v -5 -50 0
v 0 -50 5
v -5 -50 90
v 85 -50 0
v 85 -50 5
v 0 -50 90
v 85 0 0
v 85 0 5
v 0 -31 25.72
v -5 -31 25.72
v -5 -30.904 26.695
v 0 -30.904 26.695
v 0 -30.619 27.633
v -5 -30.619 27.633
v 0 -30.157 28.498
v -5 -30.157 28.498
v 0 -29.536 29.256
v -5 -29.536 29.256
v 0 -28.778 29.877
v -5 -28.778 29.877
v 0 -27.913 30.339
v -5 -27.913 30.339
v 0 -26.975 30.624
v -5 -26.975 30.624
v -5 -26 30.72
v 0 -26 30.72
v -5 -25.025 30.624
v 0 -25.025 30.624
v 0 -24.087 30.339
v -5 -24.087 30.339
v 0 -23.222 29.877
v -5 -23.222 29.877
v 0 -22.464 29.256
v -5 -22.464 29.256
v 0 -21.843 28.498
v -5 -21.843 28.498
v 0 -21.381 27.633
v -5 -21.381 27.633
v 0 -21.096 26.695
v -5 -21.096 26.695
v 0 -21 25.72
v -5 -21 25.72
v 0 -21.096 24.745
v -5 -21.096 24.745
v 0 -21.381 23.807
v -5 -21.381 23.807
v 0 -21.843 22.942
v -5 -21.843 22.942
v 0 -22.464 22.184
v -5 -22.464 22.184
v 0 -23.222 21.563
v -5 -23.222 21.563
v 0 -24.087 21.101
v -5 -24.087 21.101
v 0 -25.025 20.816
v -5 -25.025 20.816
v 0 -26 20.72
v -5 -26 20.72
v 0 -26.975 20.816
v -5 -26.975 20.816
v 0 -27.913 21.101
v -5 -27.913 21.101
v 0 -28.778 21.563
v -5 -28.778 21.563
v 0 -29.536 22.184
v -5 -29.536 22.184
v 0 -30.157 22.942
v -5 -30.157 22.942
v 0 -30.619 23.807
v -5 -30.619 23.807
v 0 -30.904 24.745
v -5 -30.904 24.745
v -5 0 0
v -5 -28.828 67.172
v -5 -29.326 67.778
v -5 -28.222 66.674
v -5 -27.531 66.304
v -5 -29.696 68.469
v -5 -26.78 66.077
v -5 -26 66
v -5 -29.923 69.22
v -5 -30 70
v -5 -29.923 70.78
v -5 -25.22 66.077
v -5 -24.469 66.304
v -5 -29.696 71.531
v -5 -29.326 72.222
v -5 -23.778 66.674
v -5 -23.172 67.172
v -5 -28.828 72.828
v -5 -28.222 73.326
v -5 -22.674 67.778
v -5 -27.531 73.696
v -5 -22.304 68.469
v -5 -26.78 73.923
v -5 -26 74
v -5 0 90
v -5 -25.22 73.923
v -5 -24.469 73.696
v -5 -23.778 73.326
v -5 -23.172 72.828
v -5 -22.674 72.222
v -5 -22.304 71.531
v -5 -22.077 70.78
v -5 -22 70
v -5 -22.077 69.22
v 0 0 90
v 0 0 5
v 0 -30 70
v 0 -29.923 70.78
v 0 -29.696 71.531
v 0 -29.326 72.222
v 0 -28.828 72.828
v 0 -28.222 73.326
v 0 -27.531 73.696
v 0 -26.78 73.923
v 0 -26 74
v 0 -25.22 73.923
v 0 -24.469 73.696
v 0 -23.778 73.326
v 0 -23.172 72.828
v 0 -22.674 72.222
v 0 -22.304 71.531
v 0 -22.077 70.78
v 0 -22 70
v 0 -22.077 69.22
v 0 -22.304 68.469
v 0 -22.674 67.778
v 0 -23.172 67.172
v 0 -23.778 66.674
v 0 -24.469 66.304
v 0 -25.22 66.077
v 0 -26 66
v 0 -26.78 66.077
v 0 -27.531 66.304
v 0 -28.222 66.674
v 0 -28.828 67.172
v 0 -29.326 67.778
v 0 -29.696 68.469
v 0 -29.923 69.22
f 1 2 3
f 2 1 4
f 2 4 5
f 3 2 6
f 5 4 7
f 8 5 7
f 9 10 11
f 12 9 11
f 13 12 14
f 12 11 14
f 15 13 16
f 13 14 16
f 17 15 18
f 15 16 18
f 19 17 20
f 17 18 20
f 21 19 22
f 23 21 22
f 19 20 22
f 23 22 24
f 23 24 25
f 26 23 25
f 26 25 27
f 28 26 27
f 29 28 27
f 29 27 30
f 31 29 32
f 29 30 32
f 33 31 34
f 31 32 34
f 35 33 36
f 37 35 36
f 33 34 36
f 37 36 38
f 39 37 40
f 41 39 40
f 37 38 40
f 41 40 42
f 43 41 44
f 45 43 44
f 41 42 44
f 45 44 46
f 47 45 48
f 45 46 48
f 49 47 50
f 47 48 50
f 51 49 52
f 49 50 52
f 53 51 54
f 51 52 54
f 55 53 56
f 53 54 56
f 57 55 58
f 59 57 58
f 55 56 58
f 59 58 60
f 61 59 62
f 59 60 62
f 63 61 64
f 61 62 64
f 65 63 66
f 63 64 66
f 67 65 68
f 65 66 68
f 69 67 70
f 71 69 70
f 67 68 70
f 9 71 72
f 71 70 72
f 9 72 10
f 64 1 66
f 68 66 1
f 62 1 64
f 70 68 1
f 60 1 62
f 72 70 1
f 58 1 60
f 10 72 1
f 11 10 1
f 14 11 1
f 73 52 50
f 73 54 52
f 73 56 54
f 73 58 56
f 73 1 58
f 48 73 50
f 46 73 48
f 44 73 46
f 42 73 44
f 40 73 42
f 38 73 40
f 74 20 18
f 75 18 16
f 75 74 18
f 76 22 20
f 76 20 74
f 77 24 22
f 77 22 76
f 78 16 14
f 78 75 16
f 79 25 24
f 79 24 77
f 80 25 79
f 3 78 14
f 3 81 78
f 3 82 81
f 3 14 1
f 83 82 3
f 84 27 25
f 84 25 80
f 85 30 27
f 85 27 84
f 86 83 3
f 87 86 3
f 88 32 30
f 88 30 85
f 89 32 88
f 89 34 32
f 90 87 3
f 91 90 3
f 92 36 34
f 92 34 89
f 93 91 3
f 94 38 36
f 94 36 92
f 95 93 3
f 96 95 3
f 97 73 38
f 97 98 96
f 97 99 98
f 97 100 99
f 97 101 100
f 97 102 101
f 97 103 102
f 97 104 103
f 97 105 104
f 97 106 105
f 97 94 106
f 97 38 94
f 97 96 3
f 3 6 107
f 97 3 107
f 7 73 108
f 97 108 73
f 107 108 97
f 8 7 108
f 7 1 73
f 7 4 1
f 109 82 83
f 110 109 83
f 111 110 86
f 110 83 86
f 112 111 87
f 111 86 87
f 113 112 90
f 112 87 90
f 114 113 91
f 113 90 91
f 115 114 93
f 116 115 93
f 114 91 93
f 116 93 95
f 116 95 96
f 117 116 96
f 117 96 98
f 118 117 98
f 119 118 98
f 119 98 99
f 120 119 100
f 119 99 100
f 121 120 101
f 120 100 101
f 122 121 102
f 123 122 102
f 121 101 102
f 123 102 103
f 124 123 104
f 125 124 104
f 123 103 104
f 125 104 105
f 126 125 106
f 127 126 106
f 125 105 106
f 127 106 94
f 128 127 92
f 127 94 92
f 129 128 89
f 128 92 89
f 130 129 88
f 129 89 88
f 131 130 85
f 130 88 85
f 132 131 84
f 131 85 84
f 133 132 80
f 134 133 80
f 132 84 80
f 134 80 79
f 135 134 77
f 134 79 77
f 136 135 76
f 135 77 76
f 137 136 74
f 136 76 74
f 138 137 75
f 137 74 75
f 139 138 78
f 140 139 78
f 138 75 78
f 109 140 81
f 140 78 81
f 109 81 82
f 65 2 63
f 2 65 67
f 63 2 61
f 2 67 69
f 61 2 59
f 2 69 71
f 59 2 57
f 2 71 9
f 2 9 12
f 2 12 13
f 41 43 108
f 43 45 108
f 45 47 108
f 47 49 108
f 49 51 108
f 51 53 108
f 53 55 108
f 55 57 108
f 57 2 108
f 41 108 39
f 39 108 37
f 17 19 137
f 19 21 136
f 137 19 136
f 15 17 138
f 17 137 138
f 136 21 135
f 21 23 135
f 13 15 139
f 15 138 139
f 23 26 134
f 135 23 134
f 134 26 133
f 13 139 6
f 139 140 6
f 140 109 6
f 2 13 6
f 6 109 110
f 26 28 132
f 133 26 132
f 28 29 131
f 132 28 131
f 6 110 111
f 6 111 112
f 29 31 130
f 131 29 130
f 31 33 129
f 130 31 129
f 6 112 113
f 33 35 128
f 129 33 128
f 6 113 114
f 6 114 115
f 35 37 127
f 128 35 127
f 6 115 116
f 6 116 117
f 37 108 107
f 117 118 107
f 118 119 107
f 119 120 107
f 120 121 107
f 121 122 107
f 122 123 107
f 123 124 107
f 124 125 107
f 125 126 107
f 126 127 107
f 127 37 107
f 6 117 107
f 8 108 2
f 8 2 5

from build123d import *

# Parameters (mm, degrees)
SKETCH1_W           = 85
SKETCH1_H           = 50
BOSS_EXTRUDE1_DEPTH = 5
SKETCH2_W           = 90
SKETCH2_H           = 50
BOSS_EXTRUDE2_DEPTH = 5
SKETCH3_R           = 4
SKETCH3_R_2         = 5
CUT_EXTRUDE1_DEPTH  = 5


with BuildPart() as part:
    # Sketch1 → Boss-Extrude1 (new body)
    with BuildSketch(Plane.XY):
        with Locations((42.5, -25)):
            Rectangle(SKETCH1_W, SKETCH1_H)
    extrude(amount=BOSS_EXTRUDE1_DEPTH)

    # Sketch2 → Boss-Extrude2 (add)
    with BuildSketch(Plane.ZY):
        with Locations((45, -25)):
            Rectangle(SKETCH2_W, SKETCH2_H)
    extrude(amount=BOSS_EXTRUDE2_DEPTH)

    # Sketch3 → Cut-Extrude1 (cut)
    with BuildSketch(Plane.ZY.offset(5)):
        with Locations(Location((70, -26, 0), (0, 0, 270))):
            Circle(SKETCH3_R)
        with Locations(Location((25.72, -26, 0), (0, 0, 270))):
            Circle(SKETCH3_R_2)
    extrude(amount=-CUT_EXTRUDE1_DEPTH, mode=Mode.SUBTRACT)


solid = part.part
